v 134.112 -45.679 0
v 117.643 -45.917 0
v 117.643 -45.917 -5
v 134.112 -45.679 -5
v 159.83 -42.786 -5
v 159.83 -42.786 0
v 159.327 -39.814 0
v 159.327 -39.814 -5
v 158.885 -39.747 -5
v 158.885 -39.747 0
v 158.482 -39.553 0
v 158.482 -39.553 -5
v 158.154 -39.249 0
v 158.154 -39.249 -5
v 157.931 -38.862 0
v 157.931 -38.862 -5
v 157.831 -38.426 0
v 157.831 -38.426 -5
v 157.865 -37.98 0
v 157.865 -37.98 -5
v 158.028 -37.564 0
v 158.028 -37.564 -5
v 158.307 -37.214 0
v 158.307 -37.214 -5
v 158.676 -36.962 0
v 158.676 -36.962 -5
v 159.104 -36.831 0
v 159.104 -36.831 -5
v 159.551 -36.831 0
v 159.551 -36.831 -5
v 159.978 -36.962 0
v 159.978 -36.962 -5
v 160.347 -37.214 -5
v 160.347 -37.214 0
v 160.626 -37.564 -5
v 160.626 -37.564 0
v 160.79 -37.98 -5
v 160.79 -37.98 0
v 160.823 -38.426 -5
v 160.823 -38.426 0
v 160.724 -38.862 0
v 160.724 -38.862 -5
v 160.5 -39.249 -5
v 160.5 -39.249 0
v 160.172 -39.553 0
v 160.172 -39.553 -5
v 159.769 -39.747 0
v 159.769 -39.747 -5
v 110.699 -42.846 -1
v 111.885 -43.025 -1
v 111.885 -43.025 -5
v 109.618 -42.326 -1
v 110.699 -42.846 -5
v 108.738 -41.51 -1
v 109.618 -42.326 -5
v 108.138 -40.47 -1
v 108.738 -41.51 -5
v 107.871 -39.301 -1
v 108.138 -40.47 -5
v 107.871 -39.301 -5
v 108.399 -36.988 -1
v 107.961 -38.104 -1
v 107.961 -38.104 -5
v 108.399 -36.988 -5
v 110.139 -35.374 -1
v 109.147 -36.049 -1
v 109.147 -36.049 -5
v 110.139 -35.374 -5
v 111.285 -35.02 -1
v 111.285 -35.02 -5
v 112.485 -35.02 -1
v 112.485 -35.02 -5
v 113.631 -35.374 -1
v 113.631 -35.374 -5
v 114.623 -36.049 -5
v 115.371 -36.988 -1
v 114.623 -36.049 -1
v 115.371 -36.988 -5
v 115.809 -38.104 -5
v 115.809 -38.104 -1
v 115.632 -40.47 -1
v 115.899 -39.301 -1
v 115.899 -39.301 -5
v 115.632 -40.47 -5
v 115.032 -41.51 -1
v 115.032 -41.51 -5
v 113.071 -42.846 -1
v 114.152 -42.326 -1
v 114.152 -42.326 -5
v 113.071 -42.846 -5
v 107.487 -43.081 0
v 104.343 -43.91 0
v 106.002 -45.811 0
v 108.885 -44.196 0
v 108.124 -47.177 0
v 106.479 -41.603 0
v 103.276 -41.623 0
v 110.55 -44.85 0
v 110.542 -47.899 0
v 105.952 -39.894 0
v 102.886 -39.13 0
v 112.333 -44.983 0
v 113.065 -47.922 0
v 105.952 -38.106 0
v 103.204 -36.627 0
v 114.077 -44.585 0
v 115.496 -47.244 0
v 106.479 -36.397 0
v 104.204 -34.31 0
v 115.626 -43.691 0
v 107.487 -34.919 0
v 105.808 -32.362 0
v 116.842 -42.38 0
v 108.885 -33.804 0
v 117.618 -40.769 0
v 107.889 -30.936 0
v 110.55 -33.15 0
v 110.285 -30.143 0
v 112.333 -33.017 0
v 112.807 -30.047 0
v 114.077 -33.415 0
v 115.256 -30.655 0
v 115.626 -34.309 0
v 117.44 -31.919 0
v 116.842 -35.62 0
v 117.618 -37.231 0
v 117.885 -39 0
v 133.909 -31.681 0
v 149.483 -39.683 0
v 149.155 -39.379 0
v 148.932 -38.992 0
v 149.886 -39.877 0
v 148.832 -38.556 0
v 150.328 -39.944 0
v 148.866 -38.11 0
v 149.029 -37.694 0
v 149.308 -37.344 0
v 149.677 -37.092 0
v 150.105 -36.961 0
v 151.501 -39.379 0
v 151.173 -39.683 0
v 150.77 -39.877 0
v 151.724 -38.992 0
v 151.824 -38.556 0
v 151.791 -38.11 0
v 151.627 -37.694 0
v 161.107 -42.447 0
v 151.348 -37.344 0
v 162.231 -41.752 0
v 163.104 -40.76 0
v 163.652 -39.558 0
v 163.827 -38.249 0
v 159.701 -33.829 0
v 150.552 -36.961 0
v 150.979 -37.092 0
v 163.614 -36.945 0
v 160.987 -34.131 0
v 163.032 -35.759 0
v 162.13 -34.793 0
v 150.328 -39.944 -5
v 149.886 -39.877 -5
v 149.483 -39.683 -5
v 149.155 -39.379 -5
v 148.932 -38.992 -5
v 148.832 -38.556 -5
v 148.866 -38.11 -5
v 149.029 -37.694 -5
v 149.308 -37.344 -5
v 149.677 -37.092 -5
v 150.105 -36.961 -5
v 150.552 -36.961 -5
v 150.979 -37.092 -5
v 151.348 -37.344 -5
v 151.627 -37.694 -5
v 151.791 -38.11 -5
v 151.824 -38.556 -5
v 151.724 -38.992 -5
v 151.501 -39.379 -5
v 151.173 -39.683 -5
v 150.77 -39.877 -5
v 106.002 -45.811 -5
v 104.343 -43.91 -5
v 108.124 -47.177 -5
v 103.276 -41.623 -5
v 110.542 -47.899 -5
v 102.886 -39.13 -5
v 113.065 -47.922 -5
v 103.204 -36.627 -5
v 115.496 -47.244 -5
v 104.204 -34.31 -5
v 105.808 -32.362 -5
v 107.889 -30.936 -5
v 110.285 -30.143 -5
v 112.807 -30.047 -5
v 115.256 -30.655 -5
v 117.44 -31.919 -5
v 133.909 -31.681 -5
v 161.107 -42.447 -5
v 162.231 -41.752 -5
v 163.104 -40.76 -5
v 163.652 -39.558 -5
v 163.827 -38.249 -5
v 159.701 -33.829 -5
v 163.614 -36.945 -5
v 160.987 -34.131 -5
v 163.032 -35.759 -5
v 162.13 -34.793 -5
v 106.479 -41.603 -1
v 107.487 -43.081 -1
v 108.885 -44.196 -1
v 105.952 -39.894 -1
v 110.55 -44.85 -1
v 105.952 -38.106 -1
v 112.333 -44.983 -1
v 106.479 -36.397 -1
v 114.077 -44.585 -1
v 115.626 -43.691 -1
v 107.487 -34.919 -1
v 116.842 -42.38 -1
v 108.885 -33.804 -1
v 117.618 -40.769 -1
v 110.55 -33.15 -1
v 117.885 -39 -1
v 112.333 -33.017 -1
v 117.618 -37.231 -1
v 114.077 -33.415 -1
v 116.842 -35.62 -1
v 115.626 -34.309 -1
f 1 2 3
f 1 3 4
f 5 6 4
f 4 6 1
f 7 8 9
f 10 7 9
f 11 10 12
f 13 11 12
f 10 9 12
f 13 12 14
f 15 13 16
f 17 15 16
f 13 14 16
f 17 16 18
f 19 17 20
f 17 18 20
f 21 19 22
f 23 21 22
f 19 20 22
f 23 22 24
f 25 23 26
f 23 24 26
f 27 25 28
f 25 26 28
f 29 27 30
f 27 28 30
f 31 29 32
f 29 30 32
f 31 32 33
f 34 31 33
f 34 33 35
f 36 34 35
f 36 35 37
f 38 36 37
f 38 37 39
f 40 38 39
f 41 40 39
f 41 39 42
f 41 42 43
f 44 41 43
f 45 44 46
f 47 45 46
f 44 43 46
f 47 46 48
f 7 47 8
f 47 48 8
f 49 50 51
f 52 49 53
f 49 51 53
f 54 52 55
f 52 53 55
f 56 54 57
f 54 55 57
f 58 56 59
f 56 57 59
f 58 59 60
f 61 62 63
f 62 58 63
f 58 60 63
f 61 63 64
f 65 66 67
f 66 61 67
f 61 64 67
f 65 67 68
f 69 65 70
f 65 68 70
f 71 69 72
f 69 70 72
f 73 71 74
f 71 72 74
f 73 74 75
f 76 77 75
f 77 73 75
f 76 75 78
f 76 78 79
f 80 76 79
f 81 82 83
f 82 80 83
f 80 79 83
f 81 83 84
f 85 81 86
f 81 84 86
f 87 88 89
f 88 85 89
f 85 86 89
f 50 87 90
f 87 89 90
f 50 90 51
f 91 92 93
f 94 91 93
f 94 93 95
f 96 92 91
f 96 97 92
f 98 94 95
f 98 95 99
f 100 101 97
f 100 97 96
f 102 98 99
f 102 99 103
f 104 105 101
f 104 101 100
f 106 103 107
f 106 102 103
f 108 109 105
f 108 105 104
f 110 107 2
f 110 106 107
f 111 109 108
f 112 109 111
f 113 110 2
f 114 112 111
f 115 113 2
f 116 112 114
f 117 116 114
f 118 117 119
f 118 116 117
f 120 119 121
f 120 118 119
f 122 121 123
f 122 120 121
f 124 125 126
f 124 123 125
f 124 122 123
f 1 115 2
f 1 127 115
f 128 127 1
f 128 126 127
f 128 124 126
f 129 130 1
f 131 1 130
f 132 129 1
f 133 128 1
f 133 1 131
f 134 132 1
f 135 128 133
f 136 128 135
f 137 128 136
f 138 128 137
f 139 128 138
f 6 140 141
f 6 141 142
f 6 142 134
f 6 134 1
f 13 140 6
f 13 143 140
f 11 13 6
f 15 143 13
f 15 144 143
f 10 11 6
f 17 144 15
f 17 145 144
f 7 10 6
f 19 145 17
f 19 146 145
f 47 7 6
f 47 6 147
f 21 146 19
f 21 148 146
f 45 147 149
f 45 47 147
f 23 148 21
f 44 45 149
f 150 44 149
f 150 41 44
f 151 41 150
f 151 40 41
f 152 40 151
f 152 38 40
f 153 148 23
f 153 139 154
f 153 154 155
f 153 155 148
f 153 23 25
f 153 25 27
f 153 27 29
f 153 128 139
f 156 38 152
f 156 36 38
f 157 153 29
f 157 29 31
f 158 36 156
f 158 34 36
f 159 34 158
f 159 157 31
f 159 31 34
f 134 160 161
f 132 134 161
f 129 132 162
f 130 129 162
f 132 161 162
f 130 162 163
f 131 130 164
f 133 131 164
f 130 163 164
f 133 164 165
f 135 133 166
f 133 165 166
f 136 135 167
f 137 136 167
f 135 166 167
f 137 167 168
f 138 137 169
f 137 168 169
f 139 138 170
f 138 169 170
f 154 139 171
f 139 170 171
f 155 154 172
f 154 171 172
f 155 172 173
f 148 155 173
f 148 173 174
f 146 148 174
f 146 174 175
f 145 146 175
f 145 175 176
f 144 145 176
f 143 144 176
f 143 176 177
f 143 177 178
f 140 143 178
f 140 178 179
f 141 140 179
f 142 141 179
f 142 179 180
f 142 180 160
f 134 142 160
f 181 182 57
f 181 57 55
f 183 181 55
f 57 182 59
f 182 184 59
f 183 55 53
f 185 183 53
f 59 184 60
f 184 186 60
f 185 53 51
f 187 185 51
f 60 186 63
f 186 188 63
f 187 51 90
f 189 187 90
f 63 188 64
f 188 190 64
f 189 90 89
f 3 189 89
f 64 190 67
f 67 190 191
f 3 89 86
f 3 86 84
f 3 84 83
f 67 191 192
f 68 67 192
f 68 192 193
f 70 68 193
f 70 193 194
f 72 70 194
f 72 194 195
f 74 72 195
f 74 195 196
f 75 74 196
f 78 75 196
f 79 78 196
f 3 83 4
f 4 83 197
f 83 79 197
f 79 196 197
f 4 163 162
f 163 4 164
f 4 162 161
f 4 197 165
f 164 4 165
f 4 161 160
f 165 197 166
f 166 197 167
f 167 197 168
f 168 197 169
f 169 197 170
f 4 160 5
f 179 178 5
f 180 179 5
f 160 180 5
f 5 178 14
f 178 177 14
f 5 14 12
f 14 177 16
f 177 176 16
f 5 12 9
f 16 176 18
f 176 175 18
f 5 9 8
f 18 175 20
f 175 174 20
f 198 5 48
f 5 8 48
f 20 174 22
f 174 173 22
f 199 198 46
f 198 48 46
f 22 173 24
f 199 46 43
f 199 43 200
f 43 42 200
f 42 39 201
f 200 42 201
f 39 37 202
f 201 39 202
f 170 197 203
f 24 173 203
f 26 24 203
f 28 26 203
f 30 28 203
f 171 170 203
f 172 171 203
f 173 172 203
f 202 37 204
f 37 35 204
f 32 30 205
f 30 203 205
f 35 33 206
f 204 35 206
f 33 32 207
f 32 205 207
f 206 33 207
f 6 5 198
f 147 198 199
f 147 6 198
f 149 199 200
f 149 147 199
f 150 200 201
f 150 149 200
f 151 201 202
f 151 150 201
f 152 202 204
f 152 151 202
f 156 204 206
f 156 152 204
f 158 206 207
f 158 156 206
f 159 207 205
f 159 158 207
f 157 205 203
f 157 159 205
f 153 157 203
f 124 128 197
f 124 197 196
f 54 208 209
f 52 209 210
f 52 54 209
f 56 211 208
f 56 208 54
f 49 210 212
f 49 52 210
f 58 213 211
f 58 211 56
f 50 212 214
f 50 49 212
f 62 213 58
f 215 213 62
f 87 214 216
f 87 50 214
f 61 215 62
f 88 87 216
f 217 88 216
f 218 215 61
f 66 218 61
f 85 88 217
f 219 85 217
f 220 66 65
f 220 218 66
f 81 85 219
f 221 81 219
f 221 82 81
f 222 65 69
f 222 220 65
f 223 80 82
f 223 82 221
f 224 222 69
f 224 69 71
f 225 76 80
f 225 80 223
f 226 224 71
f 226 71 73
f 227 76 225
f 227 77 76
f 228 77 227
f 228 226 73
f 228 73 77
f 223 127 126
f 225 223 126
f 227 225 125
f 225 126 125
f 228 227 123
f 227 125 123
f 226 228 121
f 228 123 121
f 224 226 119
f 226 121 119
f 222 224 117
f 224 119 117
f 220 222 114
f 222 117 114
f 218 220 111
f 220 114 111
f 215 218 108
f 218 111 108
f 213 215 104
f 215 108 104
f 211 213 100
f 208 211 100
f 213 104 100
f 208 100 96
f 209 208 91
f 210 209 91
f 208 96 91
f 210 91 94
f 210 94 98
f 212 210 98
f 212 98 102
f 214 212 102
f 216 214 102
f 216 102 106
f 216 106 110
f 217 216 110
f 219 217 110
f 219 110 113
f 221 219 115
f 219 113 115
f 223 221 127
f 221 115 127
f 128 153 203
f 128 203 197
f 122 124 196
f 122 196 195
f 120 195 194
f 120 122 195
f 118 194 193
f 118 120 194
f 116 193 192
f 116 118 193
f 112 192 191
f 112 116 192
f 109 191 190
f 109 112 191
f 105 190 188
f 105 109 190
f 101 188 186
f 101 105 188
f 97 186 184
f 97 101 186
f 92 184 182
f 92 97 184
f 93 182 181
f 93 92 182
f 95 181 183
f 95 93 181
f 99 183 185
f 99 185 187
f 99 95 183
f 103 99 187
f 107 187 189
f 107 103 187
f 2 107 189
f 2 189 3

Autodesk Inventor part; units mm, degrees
ref_plane "YZ Plane" through (0, 0, 0) normal (1, 0, 0) x (0, 1, 0)
ref_plane "XZ Plane" through (0, 0, 0) normal (0, 1, 0) x (-1, 0, 0)
ref_plane "XY Plane" through (0, 0, 0) normal (0, 0, 1) x (1, 0, 0)
sketch "スケッチ1" plane through (0, 0, 0) normal (0, 0, 1) x (1, 0, 0)
  line L0 (-101.5, 47.999998) -> (108.5, 47.999998)
  circle A0 centre (111.885049, -39.000002) radius 4
  circle A1 centre (191.876682, -37.842982) radius 4
  circle A2 centre (111.885049, -39.000002) radius 7
  circle A3 centre (191.876682, -37.842982) radius 7
  line L1 (191.876682, -37.842982) -> (111.885049, -39.000002) construction
  line L2 (191.775442, -30.843714) -> (111.78381, -32.000734)
  line L3 (111.986288, -45.99927) -> (191.977921, -44.84225)
  arc A4 (191.977921, -44.84225) -> (191.775442, -30.843714) centre (191.876682, -37.842982) ccw
  arc A5 (111.78381, -32.000734) -> (111.986288, -45.99927) centre (111.885049, -39.000002) ccw
  line L4 (193.542302, -31.044032) -> (241.704818, -42.842982)
  circle A6 centre (234.566446, -71.981335) radius 30
  line L5 (262.587356, -82.697145) -> (213.725294, -50.402494)
  line L6 (213.725294, -50.402494) -> (190.211062, -44.641931)
  line L7 (264.566446, -121.542906) -> (264.566446, -63.2267)
  line L8 (111.885049, -39.000002) -> (111.885049, 40.999998) construction
  line L9 (118.885049, -39.000002) -> (118.885049, 40.999998)
  line L10 (104.885049, 40.999998) -> (104.885049, -39.000002)
  arc A7 (104.885049, -39.000002) -> (118.885049, -39.000002) centre (111.885049, -39.000002) ccw
  arc A8 (118.885049, 40.999998) -> (104.885049, 40.999998) centre (111.885049, 40.999998) ccw
  circle A9 centre (58.238326, 51.481995) radius 30
  line L11 (113.558078, 34.202868) -> (65.408448, 22.351438)
  line L12 (28.441083, 47.999998) -> (86.70408, 42.010942)
  line L13 (86.70408, 42.010942) -> (110.21202, 47.797128)
  circle A10 centre (113.5, -20.000002) radius 68
  line L14 (315.327237, -100.585467) -> (70.600424, 104.764712)
  line L15 (253.850074, -49.000002) -> (111.885049, -39.000002)
  arc A11 (93.592427, -27.104845) -> (135.370976, -5.924402) centre (95.060351, 21.794105) ccw
  arc A12 (135.370976, -5.924402) -> (135.847591, -3.671647) centre (132.898992, -4.224609) ccw
  arc A13 (135.847591, -3.671647) -> (83.183341, 18.55647) centre (102.157897, -9.989602) ccw
  line L16 (111.885049, -39.000002) -> (112.74718, 40.995353) construction
  line L17 (118.884642, -39.075438) -> (119.746773, 40.919916)
  line L18 (105.747586, 41.070789) -> (104.885455, -38.924565)
  arc A14 (104.885455, -38.924565) -> (118.884642, -39.075438) centre (111.885049, -39.000002) ccw
  arc A15 (119.746773, 40.919916) -> (105.747586, 41.070789) centre (112.74718, 40.995353) ccw
  line L19 (164.994898, 47.999998) -> (164.994898, 25.999998)
  line L20 (164.994898, 25.999998) -> (327.494898, -102.000002)
  circle A16 centre (116.292557, -40.000002) radius 68
  circle A17 centre (-98.885049, -0.000002) radius 67.5
  line L21 (321.363327, -8.500986) -> (-152.668056, 78.49822)
  line L22 (104.889695, -3) -> (104.889695, 0)
  line L23 (104.889695, -3) -> (64.444342, -3)
  line L24 (72.06562, 0) -> (104.889695, 0)
  circle A18 centre (83.376901, -17.5) radius 13.85
  line L25 (198.510163, -35.607603) -> (190.779084, -12.665641)
  line L26 (185.2432, -40.07836) -> (169.408184, 6.912016)
  circle A19 centre (197.837392, 16.492211) radius 30
  line L27 (190.779084, -12.665641) -> (191.876682, 45.89408)
  circle A20 centre (191.876682, -37.842982) radius 83.737062
  line L28 (191.876682, 45.89408) -> (191.876682, -37.842982)
  line L29 (96.889695, -3) -> (96.889695, -6)
  line L30 (96.889695, -6) -> (87.889695, -6)
  line L31 (87.889695, -6) -> (87.889695, -3)
  line L32 (76.444342, -3) -> (76.444342, -6)
  line L33 (76.444342, -6) -> (67.444342, -6)
  line L34 (67.444342, -6) -> (67.444342, -3)
  line L35 (99.889695, -3) -> (99.889695, 0)
  line L36 (99.889695, 0) -> (84.889695, 0)
  line L37 (84.889695, 0) -> (84.889695, -3)
  line L38 (79.444342, -3) -> (79.444342, 0)
  line L39 (79.444342, 0) -> (64.444342, 0)
  line L40 (64.444342, 0) -> (64.444342, -3)
  line L41 (64.444342, 0) -> (59.444342, 0)
  line L42 (59.444342, 0) -> (59.444342, -3)
  line L43 (59.444342, -3) -> (64.444342, -3)
  line L44 (59.444342, -3) -> (59.444342, -6)
  circle A21 centre (111.885049, -39.000002) radius 1.5
  circle A22 centre (111.885049, -39.000002) radius 9
  circle A23 centre (111.885049, -39.000002) radius 10
  circle A24 centre (111.885049, -39.000002) radius 15
  line L45 (121.057661, -50.868582) -> (142.927269, -50.552254)
  line L46 (121.057661, -50.868582) -> (127.651316, -45.772687)
  line L47 (127.651316, -45.772687) -> (126.808053, -37.482129)
  line L48 (124.15135, -30.366471) -> (104.889695, -3)
  line L49 (101.060181, -49.383751) -> (59.444342, -6)
  circle A25 centre (95.889695, -6) radius 1
  circle A26 centre (88.889695, -6) radius 1
  circle A27 centre (95.889695, -3) radius 1
  circle A28 centre (88.889695, -3) radius 1
  circle A29 centre (100.889695, -3) radius 1
  circle A30 centre (83.889695, -3) radius 1
  circle A31 centre (80.444342, -3) radius 1
  circle A32 centre (75.444342, -6) radius 1
  circle A33 centre (68.444342, -6) radius 1
  circle A34 centre (75.444342, -3) radius 1
  circle A35 centre (68.444342, -3) radius 1
  circle A36 centre (63.444342, -3) radius 1
  line L50 (189.021336, -49.498324) -> (211.692496, -55.05235)
  line L51 (211.692496, -55.05235) -> (259.830429, -86.868398)
  circle A37 centre (191.876682, -37.842982) radius 8
  circle A38 centre (191.876682, -37.842982) radius 13
  line L52 (198.876682, -21.280236) -> (198.876682, -52.125839)
  circle A39 centre (194.376682, -52.125839) radius 4.5
  circle A40 centre (194.376682, -52.125839) radius 1.5
  circle A41 centre (177.559161, -35.549813) radius 1.5
  circle A42 centre (194.376682, -52.125839) radius 4.5
  circle A43 centre (177.559161, -35.549813) radius 4.5
  circle A44 centre (191.876682, -37.842982) radius 1.5
  circle A45 centre (191.876682, -37.842982) radius 4.5
  line L53 (198.809292, -51.349976) -> (196.309292, -37.06712)
  line L54 (192.588353, -33.399614) -> (178.270831, -31.106451)
  circle A46 centre (181.698049, -48.169909) radius 1.5
  circle A47 centre (181.698049, -48.169909) radius 4.5
  line L55 (193.036341, -56.421591) -> (180.357708, -52.465661)
  line L56 (177.422132, -49.57224) -> (173.283242, -36.952144)
  point P0 (0, 0)
  point P1 (0, 0)
  point P2 (151.880865, -38.421492)
  point P3 (111.885049, 0.999998)
  point P4 (105.885049, -0.000002)
  point P5 (105.885049, -0.000002)
  point P6 (23.732778, -42.728965)
  point P7 (112.316114, 0.997675)
  point P8 (99.889695, -1.5)
  point P9 (76.444342, -4.5)
  point P10 (74.444342, -6)
  point P11 (69.444342, -6)
  point P12 (69.444342, -3)
  point P13 (74.444342, -3)
  point P14 (82.889695, -3)
  point P15 (81.444342, -3)
  point P16 (62.444342, -3)
  point P17 (101.889695, -3)
  point P18 (89.889695, -3)
  point P19 (94.889695, -3)
  point P20 (94.889695, -6)
  point P21 (89.889695, -6)
  point P22 (118.961603, -31.934425)
  point P23 (118.924491, -31.897449)
  point P24 (118.962007, -31.896907)
  point P25 (119.12697, -45.895985)
  point P26 (104.885049, -3)
  point P27 (104.885049, -31.858573)
  point P28 (117.642551, -45.917456)
  point P29 (175.94693, -45.074126)
  point P30 (198.871572, -51.911454)
  point P31 (198.876682, -51.912706)
  point P32 (198.876682, -46.764852)
  point P33 (193.972807, -45.563491)
  point P34 (184.006402, -36.408166)
  point P35 (182.178049, -30.982533)
  point P36 (117.440072, -31.91892)
  point P37 (180.360015, -43.873438)
  point P38 (180.33295, -43.821464)
  point P39 (180.497374, -43.833046)
  dimension "d27" = 167.47412
  dimension "d70" = 9
  dimension "d0" = 8
  dimension "d1" = 8
  dimension "d2" = 3
  dimension "d3" = 3
  dimension "d4" = 80
  dimension "d5" = 14
  dimension "d6" = 14
  dimension "d7" = 60
  dimension "d8" = 14
  dimension "d9" = 60
  dimension "d10" = 14
  dimension "d11" = 6
  dimension "d12" = 40
  dimension "d13" = 13.271
  dimension "d14" = 14
  dimension "d15" = 10
  dimension "d16" = 5
  dimension "d17" = 22
  dimension "d18" = 150
  dimension "d19" = 162.5
  dimension "d20" = 0
  dimension "d21" = 136
  dimension "d22" = 136
  dimension "d23" = 135
  dimension "d24" = 38.2272
  dimension "d25" = 25
  dimension "d26" = 60
  dimension "d28" = 5
  dimension "d29" = 3
  dimension "d30" = 5
  dimension "d31" = 3
  dimension "d32" = 3
  dimension "d33" = 5
  dimension "d34" = 1
  dimension "d35" = 5
  dimension "d36" = 5
  dimension "d37" = 2
  dimension "d38" = 2
  dimension "d39" = 2
  dimension "d40" = 2
  dimension "d41" = 2
  dimension "d42" = 2
  dimension "d43" = 2
  dimension "d44" = 2
  dimension "d45" = 2
  dimension "d46" = 2
  dimension "d47" = 2
  dimension "d48" = 2
  dimension "d49" = 5
  dimension "d50" = 1
  dimension "d51" = 6
  dimension "d57" = 3
  dimension "d58" = 3
  dimension "d59" = 3
  dimension "d60" = 3
  dimension "d61" = 3
  dimension "d62" = 3
  dimension "d65" = 109.028
  dimension "d67" = 3
  dimension "d68" = 9
  dimension "d69" = 72.2057
  dimension "d71" = 54.514
sketch "スケッチ1 outline for 押し出し1" plane through (0, 0, 0) normal (0, 0, 1) x (1, 0, 0)
  arc A0 (117.440072, -31.91892) -> (117.642551, -45.917456) centre (111.885049, -39.000002) ccw
  line L0 (182.178049, -30.982533) -> (117.440072, -31.91892)
  line L1 (117.642551, -45.917456) -> (175.94693, -45.074126)
  line L2 (184.006402, -36.408166) -> (182.178049, -30.982533)
  line L3 (175.94693, -45.074126) -> (177.422132, -49.57224)
  arc A1 (193.972807, -45.563491) -> (184.006402, -36.408166) centre (191.876682, -37.842982) cw
  arc A2 (177.422132, -49.57224) -> (180.357708, -52.465661) centre (181.698047, -48.169912) ccw
  line L4 (198.876682, -46.764852) -> (193.972807, -45.563491)
  line L5 (180.357708, -52.465661) -> (193.036341, -56.421591)
  line L6 (198.876682, -51.912706) -> (198.876682, -46.764852)
  arc A3 (193.036341, -56.421591) -> (198.871572, -51.911454) centre (194.376682, -52.125838) ccw
  line L7 (198.871572, -51.911454) -> (198.876682, -51.912706)
  arc A4 (180.360015, -43.873438) -> (180.33295, -43.821464) centre (191.876682, -37.842982) cw
  arc A5 (180.497374, -43.833046) -> (180.360015, -43.873438) centre (181.698049, -48.169909) ccw
  line L8 (180.33295, -43.821464) -> (180.497374, -43.833046)
  circle A6 centre (181.698049, -48.169909) radius 1.5
  circle A7 centre (194.376682, -52.125839) radius 1.5
  circle A8 centre (177.559161, -35.549813) radius 1.5
extrude "押し出し1" add sketch "スケッチ1 outline for 押し出し1" against normal blind 5
hole "穴1" at (105.885049, -0.000002, 0) at (113.5, -20.000002, 0) at (23.732778, -42.728965, 0) at (-98.885049, -0.000002, 0) at (111.885049, -39.000002, 0) direction (0, 0, -1) diameter 8.05 depth 12 tip angle 118
sketch "スケッチ2" plane through (0, 0, 0) normal (0, 0, 1) x (1, 0, 0)
  circle A0 centre (111.885049, -39.000002) radius 4.025
  line L0 (182.178049, -30.982533) -> (117.440072, -31.91892)
  arc A1 (117.440072, -31.91892) -> (117.642551, -45.917456) centre (111.885049, -39.000002) ccw
  line L1 (117.642551, -45.917456) -> (175.94693, -45.074126)
  line L2 (175.94693, -45.074126) -> (177.422132, -49.57224)
  arc A2 (177.422132, -49.57224) -> (180.357708, -52.465661) centre (181.698049, -48.169909) ccw
  line L3 (180.357708, -52.465661) -> (193.036341, -56.421591)
  arc A3 (193.036341, -56.421591) -> (198.871572, -51.911454) centre (194.376682, -52.125839) ccw
  line L4 (198.871572, -51.911454) -> (198.876682, -51.912706)
  line L5 (198.876682, -51.912706) -> (198.876682, -46.764852)
  line L6 (198.876682, -46.764852) -> (193.972807, -45.563491)
  arc A4 (184.006402, -36.408166) -> (193.972807, -45.563491) centre (191.876682, -37.842982) ccw
  line L7 (184.006402, -36.408166) -> (182.178049, -30.982533)
  circle A5 centre (194.376682, -52.125839) radius 1.5
  circle A6 centre (177.559161, -35.549813) radius 1.5
  circle A7 centre (181.698049, -48.169909) radius 1.5
  arc A8 (180.497374, -43.833046) -> (180.360015, -43.873438) centre (181.698049, -48.169909) ccw
  arc A9 (180.33295, -43.821464) -> (180.360015, -43.873438) centre (191.876682, -37.842982) ccw
  line L8 (180.33295, -43.821464) -> (180.497374, -43.833046)
  circle A10 centre (191.876682, -37.842982) radius 4.025
  arc A11 (193.542302, -31.044032) -> (185.672866, -34.600657) centre (191.876682, -37.842982) ccw
  line L9 (185.672866, -34.600657) -> (178.725027, -47.894548)
  line L10 (178.725027, -47.894548) -> (183.433896, -52.404723)
  line L11 (183.433896, -52.404723) -> (188.697561, -50.51843)
  line L12 (188.697561, -50.51843) -> (189.57433, -47.017413)
  line L13 (189.57433, -47.017413) -> (184.168816, -48.954539)
  line L14 (184.168816, -48.954539) -> (183.179583, -48.007047)
  line L15 (183.179583, -48.007047) -> (184.569151, -45.348268)
  line L16 (184.569151, -45.348268) -> (191.263493, -44.899758)
  line L17 (191.263493, -44.899758) -> (213.725294, -50.402494)
  line L18 (213.725294, -50.402494) -> (262.587356, -82.697145)
  arc A12 (262.587356, -82.697145) -> (241.704818, -42.842982) centre (234.566446, -71.981335) ccw
  line L19 (241.704818, -42.842982) -> (193.542302, -31.044032)
  circle A13 centre (191.876682, -37.842982) radius 16.83226
  circle A14 centre (177.559161, -35.549813) radius 1.5
  circle A15 centre (178.961677, -35.529526) radius 4.5
  line L20 (182.178049, -30.982533) -> (117.440072, -31.91892)
  circle A16 centre (178.961677, -35.529526) radius 1.5
  circle A17 centre (166.904743, -40.704444) radius 4.5
  circle A18 centre (166.904743, -40.704444) radius 1.5
  line L21 (191.876682, -37.842982) -> (178.961677, -35.529526)
  line L22 (178.961677, -35.529526) -> (166.904743, -40.704444)
  point P0 (0, 0)
  point P1 (0, 0)
  dimension "d82" = 9
  dimension "d83" = 3
  dimension "d84" = 9
  dimension "d85" = 3
sketch "スケッチ3" plane through (0, 0, 0) normal (0, 0, 1) x (1, 0, 0)
  circle A0 centre (191.876682, -37.842982) radius 4.025
  line L0 (185.418769, -40.543975) -> (191.206612, -54.382359)
  line L1 (191.206612, -54.382359) -> (196.207213, -53.344445)
  line L2 (196.207213, -53.344445) -> (200.870857, -49.312531)
  line L3 (200.870857, -49.312531) -> (194.016935, -50.735116)
  line L4 (194.016935, -50.735116) -> (192.175534, -46.332438)
  line L5 (192.175534, -46.332438) -> (193.402436, -45.42376)
  line L6 (193.402436, -45.42376) -> (213.725294, -50.402494)
  line L7 (213.725294, -50.402494) -> (262.587356, -82.697145)
  arc A1 (262.587356, -82.697145) -> (241.704818, -42.842982) centre (234.566446, -71.981335) ccw
  line L8 (241.704818, -42.842982) -> (193.542302, -31.044032)
  arc A2 (193.542302, -31.044032) -> (185.418769, -40.543975) centre (191.876682, -37.842982) ccw
  point P0 (0, 0)
  point P1 (0, 0)
sketch "スケッチ4" plane through (0, 0, 0) normal (0, 0, 1) x (1, 0, 0)
  line L0 (194.745121, -45.752694) -> (213.725294, -50.402494)
  line L1 (213.725294, -50.402494) -> (262.587356, -82.697145)
  arc A0 (262.587356, -82.697145) -> (241.704818, -42.842982) centre (234.566446, -71.981335) ccw
  line L2 (241.704818, -42.842982) -> (193.542302, -31.044032)
  arc A1 (193.542302, -31.044032) -> (185.418769, -40.543975) centre (191.876682, -37.842982) ccw
  line L3 (185.418769, -40.543975) -> (191.206612, -54.382359)
  line L4 (191.206612, -54.382359) -> (195.655899, -53.216469)
  line L5 (195.655899, -53.216469) -> (195.656069, -53.216296)
  arc A2 (195.656069, -53.216296) -> (195.656308, -53.216236) centre (194.922022, -50.307486) ccw
  line L6 (195.656308, -53.216236) -> (198.568436, -51.556289)
  line L7 (198.568436, -51.556289) -> (199.758723, -49.040078)
  line L8 (199.758723, -49.040078) -> (195.762722, -50.087189)
  arc A3 (194.586681, -49.505705) -> (195.762722, -50.087189) centre (195.50924, -49.119849) ccw
  line L9 (194.586681, -49.505705) -> (193.584616, -47.109828)
  arc A4 (194.745121, -45.752694) -> (193.584616, -47.109828) centre (194.507175, -46.723972) ccw
  circle A5 centre (191.876682, -37.842982) radius 4.025
  circle A6 centre (111.885049, -39.000002) radius 4.025
  line L10 (182.178049, -30.982533) -> (117.440072, -31.91892)
  arc A7 (117.440072, -31.91892) -> (117.642551, -45.917456) centre (111.885049, -39.000002) ccw
  line L11 (117.642551, -45.917456) -> (175.94693, -45.074126)
  line L12 (175.94693, -45.074126) -> (177.422132, -49.57224)
  arc A8 (177.422132, -49.57224) -> (180.357708, -52.465661) centre (181.698049, -48.169909) ccw
  line L13 (180.357708, -52.465661) -> (193.036341, -56.421591)
  arc A9 (193.036341, -56.421591) -> (198.871572, -51.911454) centre (194.376682, -52.125839) ccw
  line L14 (198.871572, -51.911454) -> (198.876682, -51.912706)
  line L15 (198.876682, -51.912706) -> (198.876682, -46.764852)
  line L16 (198.876682, -46.764852) -> (193.972807, -45.563491)
  arc A10 (184.006402, -36.408166) -> (193.972807, -45.563491) centre (191.876682, -37.842982) ccw
  line L17 (184.006402, -36.408166) -> (182.178049, -30.982533)
  circle A11 centre (194.376682, -52.125839) radius 1.5
  circle A12 centre (177.559161, -35.549813) radius 1.5
  circle A13 centre (181.698049, -48.169909) radius 1.5
  arc A14 (180.497374, -43.833046) -> (180.360015, -43.873438) centre (181.698049, -48.169909) ccw
  arc A15 (180.33295, -43.821464) -> (180.360015, -43.873438) centre (191.876682, -37.842982) ccw
  line L18 (180.33295, -43.821464) -> (180.497374, -43.833046)
  line L19 (191.876682, -37.842982) -> (111.885049, -39.000002) construction
  line L20 (191.775442, -30.843714) -> (111.78381, -32.000734)
  line L21 (111.986288, -45.99927) -> (191.977921, -44.84225)
  arc A16 (191.977921, -44.84225) -> (191.775442, -30.843714) centre (191.876682, -37.842982) ccw
  arc A17 (111.78381, -32.000734) -> (111.986288, -45.99927) centre (111.885049, -39.000002) ccw
  circle A18 centre (178.961677, -35.529526) radius 4.5
  circle A19 centre (178.961677, -35.529526) radius 1.5
  circle A20 centre (183.157555, -46.799925) radius 1.5
  circle A21 centre (183.157555, -46.799925) radius 4.5
  line L22 (182.178049, -30.982533) -> (117.440072, -31.91892)
  line L23 (197.834841, -41.517261) -> (208.997311, -23.41636)
  line L24 (197.834841, -41.517261) -> (181.973255, -67.238185)
  circle A22 centre (170.35293, -38.154307) radius 4.5
  circle A23 centre (170.35293, -38.154307) radius 1.5
  line L25 (188.270523, -60.320544) -> (180.805974, -42.473256)
  arc A24 (194.73203, -26.18764) -> (180.805974, -42.473256) centre (191.876682, -37.842982) ccw
  line L26 (194.73203, -26.18764) -> (242.894547, -37.986589)
  arc A25 (264.570959, -90.00158) -> (242.894547, -37.986589) centre (234.566446, -71.981335) ccw
  line L27 (264.570959, -90.00158) -> (211.692496, -55.05235)
  line L28 (208.863654, -41.485411) -> (202.414104, -55.119458)
  line L29 (202.414104, -55.119458) -> (198.735697, -57.216192)
  line L30 (198.735697, -57.216192) -> (198.256714, -57.703764)
  line L31 (198.256714, -57.703764) -> (188.270523, -60.320544)
  line L32 (189.614177, -50.574943) -> (183.680676, -51.269416)
  arc A26 (184.006402, -36.408166) -> (193.972807, -45.563491) centre (191.876682, -37.842982) ccw
  point P0 (0, 0)
  point P1 (0, 0)
  point P2 (151.880865, -38.421492)
  point P3 (186.913184, -44.11703)
  point P4 (186.913184, -44.11703)
  point P5 (179.020383, -45.029671)
  dimension "d90" = 9
  dimension "d86" = 14
  dimension "d87" = 9
  dimension "d88" = 3
  dimension "d89" = 3
  dimension "d91" = 122.49
  dimension "d92" = 9
  dimension "d93" = 3
  dimension "d94" = 5
  dimension "d95" = 7
extrude "押し出し2" cut sketch "スケッチ4" against normal blind 10 contours L0 L24 A2 L9 A4 | A4 L9 A2 L24 L3 L21 A10 L16 | L0 L15 L8 A2 L24 | L24 L9 A2 | A2 L8 A3 L9 L24 | L9 L24 A2 | L21 L3 A10 | L15 L7 L6 A2 L8 | A2 L6 A11 L24 L9 A3 L8 | A2 A11 L4 L3 L24 | L15 L14 A9 L13 L24 L3 L4 A11 A2 L6 L7 | L24 L13 L25 L32 L3 | A2 L6 | A2 L4 A11 | L25 L13 A8 L12 L21 A21 L32 picked at (195.430042, -53.271235)
extrude "押し出し3" add sketch "スケッチ4" against normal blind 5 contours A20 A13 | A13 L25 A20 | A13 L25 | A19 A12 | A12 A19 picked at (182.922726, -47.847814)
hole "穴2" at (183.157555, -46.799925, 0) at (178.961677, -35.529526, 0) at (170.35293, -38.154307, 0) direction (0, 0, -1) diameter 3 depth 12 tip angle 118
sketch "スケッチ5" plane through (0, 0, 0) normal (0, 0, 1) x (1, 0, 0)
  circle A0 centre (178.961677, -35.529526) radius 1.5
  circle A1 centre (183.157555, -46.799925) radius 1.5
  circle A2 centre (170.35293, -38.154307) radius 1.5
  line L0 (189.614177, -50.574943) -> (186.913184, -44.11703)
  arc A3 (184.006402, -36.408166) -> (186.913184, -44.11703) centre (191.876682, -37.842982) ccw
  line L1 (184.006402, -36.408166) -> (182.178049, -30.982533)
  line L2 (182.178049, -30.982533) -> (117.440072, -31.91892)
  arc A4 (117.440072, -31.91892) -> (117.642551, -45.917456) centre (111.885049, -39.000002) ccw
  line L3 (117.642551, -45.917456) -> (179.020383, -45.029671)
  arc A5 (179.020383, -45.029671) -> (183.680676, -51.269416) centre (183.157555, -46.799925) ccw
  line L4 (183.680676, -51.269416) -> (189.614177, -50.574943)
  circle A6 centre (111.885049, -39.000002) radius 4.025
  arc A7 (180.497374, -43.833046) -> (180.360015, -43.873438) centre (181.698049, -48.169909) ccw
  arc A8 (180.33295, -43.821464) -> (180.360015, -43.873438) centre (191.876682, -37.842982) ccw
  line L5 (180.33295, -43.821464) -> (180.497374, -43.833046)
  circle A9 centre (111.885049, -39.000002) radius 4.025
  circle A10 centre (111.885049, -39.000002) radius 6
  point P0 (0, 0)
  dimension "d107" = 12
extrude "押し出し4" cut sketch "スケッチ5" against normal blind 1 contours A10
sketch "スケッチ6" plane through (0, 0, 0) normal (0, 0, 1) x (1, 0, 0)
  circle A0 centre (111.885049, -39.000002) radius 6
  circle A1 centre (178.961677, -35.529526) radius 1.5
  circle A2 centre (183.157555, -46.799925) radius 1.5
  circle A3 centre (170.35293, -38.154307) radius 1.5
  line L0 (189.614177, -50.574943) -> (186.913184, -44.11703)
  arc A4 (184.006402, -36.408166) -> (186.913184, -44.11703) centre (191.876682, -37.842982) ccw
  line L1 (184.006402, -36.408166) -> (182.178049, -30.982533)
  line L2 (182.178049, -30.982533) -> (117.440072, -31.91892)
  arc A5 (117.440072, -31.91892) -> (117.642551, -45.917456) centre (111.885049, -39.000002) ccw
  line L3 (117.642551, -45.917456) -> (179.020383, -45.029671)
  arc A6 (179.020383, -45.029671) -> (183.680676, -51.269416) centre (183.157555, -46.799925) ccw
  line L4 (183.680676, -51.269416) -> (189.614177, -50.574943)
  arc A7 (180.497374, -43.833046) -> (180.360015, -43.873438) centre (181.698049, -48.169909) ccw
  arc A8 (180.33295, -43.821464) -> (180.360015, -43.873438) centre (191.876682, -37.842982) ccw
  line L5 (180.33295, -43.821464) -> (180.497374, -43.833046)
  circle A9 centre (170.35293, -38.154307) radius 1.5
  circle A10 centre (170.35293, -38.154307) radius 4.5
  circle A11 centre (191.876682, -37.842982) radius 7
  line L6 (184.006402, -36.408166) -> (185.2432, -40.07836)
  line L7 (188.222991, -43.813789) -> (160.136439, -26.626904)
  line L8 (160.136439, -26.626904) -> (159.163513, -26.031546)
  circle A12 centre (166.361389, -35.71178) radius 4.5
  circle A13 centre (166.361389, -35.71178) radius 1.5
  line L9 (182.178049, -30.982533) -> (117.440072, -31.91892)
  circle A14 centre (175.744086, -41.453294) radius 4.5
  point P0 (0, 0)
  point P1 (178.464745, -45.037708)
  point P2 (173.128236, -45.114896)
  point P3 (167.598953, -31.193409)
  point P4 (184.919442, -41.792263)
  dimension "d110" = 9
  dimension "d111" = 14
  dimension "d112" = 9
  dimension "d113" = 3
  dimension "d114" = 9
  dimension "d115" = 11
extrude "押し出し5" add sketch "スケッチ6" against normal blind 5 contours A3 A12 | A12 A3 | L3 A14 | A7 A8 L5
hole "穴3" at (175.744086, -41.453294, 0) at (166.361389, -35.71178, 0) direction (0, 0, -1) diameter 3 depth 12 tip angle 118
extrude "押し出し6" cut sketch "スケッチ6" against normal blind 10 contours L7 L2 L1 A4
sketch "スケッチ7" plane through (0, 0, 0) normal (0, 0, 1) x (1, 0, 0)
  circle A0 centre (175.744086, -41.453294) radius 1.5
  circle A1 centre (166.361389, -35.71178) radius 1.5
  circle A2 centre (111.885049, -39.000002) radius 6
  circle A3 centre (183.157555, -46.799925) radius 1.5
  line L0 (186.913184, -44.11703) -> (189.614177, -50.574943)
  line L1 (189.614177, -50.574943) -> (183.680676, -51.269416)
  arc A4 (179.020383, -45.029671) -> (183.680676, -51.269416) centre (183.157555, -46.799925) ccw
  line L2 (179.020383, -45.029671) -> (178.464745, -45.037708)
  arc A5 (173.128236, -45.114896) -> (178.464745, -45.037708) centre (175.744086, -41.453294) ccw
  line L3 (173.128236, -45.114896) -> (117.642551, -45.917456)
  arc A6 (117.440072, -31.91892) -> (117.642551, -45.917456) centre (111.885049, -39.000002) ccw
  line L4 (117.440072, -31.91892) -> (167.598953, -31.193409)
  line L5 (167.598953, -31.193409) -> (184.919442, -41.792263)
  arc A7 (184.919442, -41.792263) -> (186.913184, -44.11703) centre (191.876682, -37.842982) ccw
  point P0 (0, 0)
sketch "スケッチ8" plane through (0, 0, 0) normal (0, 0, 1) x (1, 0, 0)
  line L0 (184.919442, -41.792263) -> (167.598953, -31.193409)
  line L1 (167.598953, -31.193409) -> (117.440072, -31.91892)
  arc A0 (117.440072, -31.91892) -> (117.642551, -45.917456) centre (111.885049, -39.000002) ccw
  line L2 (117.642551, -45.917456) -> (173.128236, -45.114896)
  arc A1 (173.128236, -45.114896) -> (178.464745, -45.037708) centre (175.744086, -41.453294) ccw
  line L3 (178.464745, -45.037708) -> (179.020383, -45.029671)
  arc A2 (179.020383, -45.029671) -> (183.680676, -51.269416) centre (183.157555, -46.799925) ccw
  line L4 (183.680676, -51.269416) -> (189.614177, -50.574943)
  line L5 (189.614177, -50.574943) -> (186.913184, -44.11703)
  arc A3 (184.919442, -41.792263) -> (186.913184, -44.11703) centre (191.876682, -37.842982) ccw
  circle A4 centre (183.157555, -46.799925) radius 1.5
  circle A5 centre (111.885049, -39.000002) radius 6
  circle A6 centre (166.361389, -35.71178) radius 1.5
  circle A7 centre (175.744086, -41.453294) radius 1.5
  circle A8 centre (111.885049, -39.000002) radius 4.025
  line L6 (191.876682, -37.842982) -> (111.885049, -39.000002)
  circle A9 centre (166.361389, -35.71178) radius 1.5
  circle A10 centre (166.361389, -35.71178) radius 4.5
  circle A11 centre (160.94376, -38.290404) radius 4.5
  circle A12 centre (160.94376, -38.290404) radius 1.5
  circle A13 centre (151.944701, -38.420568) radius 4.5
  circle A14 centre (151.944701, -38.420568) radius 1.5
  circle A15 centre (160.94376, -38.290404) radius 3
  circle A16 centre (151.944701, -38.420568) radius 3
  line L7 (165.530413, -31.28917) -> (151.113726, -33.997958)
  circle A17 centre (175.744086, -41.453294) radius 4.5
  line L8 (151.375872, -42.884472) -> (175.175257, -45.917198)
  arc A18 (117.440072, -31.91892) -> (117.642551, -45.917456) centre (111.885049, -39.000002) ccw
  circle A19 centre (111.885049, -39.000002) radius 9
  line L9 (161.421253, -42.764999) -> (112.840034, -47.949192)
  line L10 (161.291636, -33.80387) -> (112.580802, -30.026935)
  point P0 (0, 0)
  point P1 (0, 0)
  point P2 (169.312318, -45.170091)
  point P3 (166.296306, -31.212251)
  point P4 (134.111814, -45.67924)
  point P5 (168.71019, -31.873404)
  point P6 (166.296306, -31.212251)
  point P7 (133.909336, -31.680705)
  dimension "d128" = 9
  dimension "d129" = 3
  dimension "d130" = 9
  dimension "d131" = 3
  dimension "d132" = 6
  dimension "d133" = 6
  dimension "d134" = 9
extrude "押し出し7" cut sketch "スケッチ8" against normal blind 10 contours A3 L5 L4 A2 L3 A17 L6 L0 | L6 A17 L0 | A17 L6 A10 L0 | A17 L6 | A17 A1 L6 | A10 L1 L0 | A6 | A10 L6 A11 | A17 L2 L8 L9 A11 A10 L6 | A10 L7 L10 L1 | A10 A11 L6 | A10 A11 L10 L7 | L2 L9 L8 | A7
sketch "スケッチ9" plane through (0, 0, 0) normal (0, 0, 1) x (1, 0, 0)
  line L0 (161.291636, -33.80387) -> (133.909336, -31.680705)
  line L1 (133.909336, -31.680705) -> (117.440072, -31.91892)
  arc A0 (117.440072, -31.91892) -> (117.642551, -45.917456) centre (111.885049, -39.000002) ccw
  line L2 (117.642551, -45.917456) -> (134.111814, -45.67924)
  line L3 (134.111814, -45.67924) -> (161.421253, -42.764999)
  arc A1 (161.421253, -42.764999) -> (161.291636, -33.80387) centre (160.94376, -38.290404) ccw
  circle A2 centre (111.885049, -39.000002) radius 6
  circle A3 centre (166.361389, -35.71178) radius 1.5
  circle A4 centre (166.361389, -35.71178) radius 3
  line L4 (160.94376, -38.290404) -> (151.944701, -38.420568)
  circle A5 centre (159.327217, -38.313786) radius 4.5
  line L5 (117.642551, -45.917456) -> (134.111814, -45.67924)
  line L6 (159.830351, -42.78557) -> (134.111814, -45.67924)
  line L7 (161.291636, -33.80387) -> (133.909336, -31.680705)
  line L8 (159.700806, -33.82932) -> (133.909336, -31.680705)
  circle A6 centre (150.328159, -38.443951) radius 4.5
  point P0 (0, 0)
  dimension "d146" = 6
  dimension "d147" = 9
  dimension "d148" = 9
  dimension "d149" = 9
hole "穴5" at (159.327217, -38.313786, 0) at (150.328159, -38.443951, 0) direction (0, 0, -1) diameter 3 depth 12 tip angle 118
extrude "押し出し9" cut sketch "スケッチ9" against normal blind 10 contours A1 A4 A5 L8 L0 | A1 A4 | A4 A1 L3 L6 A5 picked at (164.393308, -36.270533)
equation "\"d9\" = d7"
equation "\"d26\" = d7"
equation "\"d71\" = 0.5 * d65"
properties part number "後ろウィング中間ver2根元" material "ポリカーボネート、クリア"
